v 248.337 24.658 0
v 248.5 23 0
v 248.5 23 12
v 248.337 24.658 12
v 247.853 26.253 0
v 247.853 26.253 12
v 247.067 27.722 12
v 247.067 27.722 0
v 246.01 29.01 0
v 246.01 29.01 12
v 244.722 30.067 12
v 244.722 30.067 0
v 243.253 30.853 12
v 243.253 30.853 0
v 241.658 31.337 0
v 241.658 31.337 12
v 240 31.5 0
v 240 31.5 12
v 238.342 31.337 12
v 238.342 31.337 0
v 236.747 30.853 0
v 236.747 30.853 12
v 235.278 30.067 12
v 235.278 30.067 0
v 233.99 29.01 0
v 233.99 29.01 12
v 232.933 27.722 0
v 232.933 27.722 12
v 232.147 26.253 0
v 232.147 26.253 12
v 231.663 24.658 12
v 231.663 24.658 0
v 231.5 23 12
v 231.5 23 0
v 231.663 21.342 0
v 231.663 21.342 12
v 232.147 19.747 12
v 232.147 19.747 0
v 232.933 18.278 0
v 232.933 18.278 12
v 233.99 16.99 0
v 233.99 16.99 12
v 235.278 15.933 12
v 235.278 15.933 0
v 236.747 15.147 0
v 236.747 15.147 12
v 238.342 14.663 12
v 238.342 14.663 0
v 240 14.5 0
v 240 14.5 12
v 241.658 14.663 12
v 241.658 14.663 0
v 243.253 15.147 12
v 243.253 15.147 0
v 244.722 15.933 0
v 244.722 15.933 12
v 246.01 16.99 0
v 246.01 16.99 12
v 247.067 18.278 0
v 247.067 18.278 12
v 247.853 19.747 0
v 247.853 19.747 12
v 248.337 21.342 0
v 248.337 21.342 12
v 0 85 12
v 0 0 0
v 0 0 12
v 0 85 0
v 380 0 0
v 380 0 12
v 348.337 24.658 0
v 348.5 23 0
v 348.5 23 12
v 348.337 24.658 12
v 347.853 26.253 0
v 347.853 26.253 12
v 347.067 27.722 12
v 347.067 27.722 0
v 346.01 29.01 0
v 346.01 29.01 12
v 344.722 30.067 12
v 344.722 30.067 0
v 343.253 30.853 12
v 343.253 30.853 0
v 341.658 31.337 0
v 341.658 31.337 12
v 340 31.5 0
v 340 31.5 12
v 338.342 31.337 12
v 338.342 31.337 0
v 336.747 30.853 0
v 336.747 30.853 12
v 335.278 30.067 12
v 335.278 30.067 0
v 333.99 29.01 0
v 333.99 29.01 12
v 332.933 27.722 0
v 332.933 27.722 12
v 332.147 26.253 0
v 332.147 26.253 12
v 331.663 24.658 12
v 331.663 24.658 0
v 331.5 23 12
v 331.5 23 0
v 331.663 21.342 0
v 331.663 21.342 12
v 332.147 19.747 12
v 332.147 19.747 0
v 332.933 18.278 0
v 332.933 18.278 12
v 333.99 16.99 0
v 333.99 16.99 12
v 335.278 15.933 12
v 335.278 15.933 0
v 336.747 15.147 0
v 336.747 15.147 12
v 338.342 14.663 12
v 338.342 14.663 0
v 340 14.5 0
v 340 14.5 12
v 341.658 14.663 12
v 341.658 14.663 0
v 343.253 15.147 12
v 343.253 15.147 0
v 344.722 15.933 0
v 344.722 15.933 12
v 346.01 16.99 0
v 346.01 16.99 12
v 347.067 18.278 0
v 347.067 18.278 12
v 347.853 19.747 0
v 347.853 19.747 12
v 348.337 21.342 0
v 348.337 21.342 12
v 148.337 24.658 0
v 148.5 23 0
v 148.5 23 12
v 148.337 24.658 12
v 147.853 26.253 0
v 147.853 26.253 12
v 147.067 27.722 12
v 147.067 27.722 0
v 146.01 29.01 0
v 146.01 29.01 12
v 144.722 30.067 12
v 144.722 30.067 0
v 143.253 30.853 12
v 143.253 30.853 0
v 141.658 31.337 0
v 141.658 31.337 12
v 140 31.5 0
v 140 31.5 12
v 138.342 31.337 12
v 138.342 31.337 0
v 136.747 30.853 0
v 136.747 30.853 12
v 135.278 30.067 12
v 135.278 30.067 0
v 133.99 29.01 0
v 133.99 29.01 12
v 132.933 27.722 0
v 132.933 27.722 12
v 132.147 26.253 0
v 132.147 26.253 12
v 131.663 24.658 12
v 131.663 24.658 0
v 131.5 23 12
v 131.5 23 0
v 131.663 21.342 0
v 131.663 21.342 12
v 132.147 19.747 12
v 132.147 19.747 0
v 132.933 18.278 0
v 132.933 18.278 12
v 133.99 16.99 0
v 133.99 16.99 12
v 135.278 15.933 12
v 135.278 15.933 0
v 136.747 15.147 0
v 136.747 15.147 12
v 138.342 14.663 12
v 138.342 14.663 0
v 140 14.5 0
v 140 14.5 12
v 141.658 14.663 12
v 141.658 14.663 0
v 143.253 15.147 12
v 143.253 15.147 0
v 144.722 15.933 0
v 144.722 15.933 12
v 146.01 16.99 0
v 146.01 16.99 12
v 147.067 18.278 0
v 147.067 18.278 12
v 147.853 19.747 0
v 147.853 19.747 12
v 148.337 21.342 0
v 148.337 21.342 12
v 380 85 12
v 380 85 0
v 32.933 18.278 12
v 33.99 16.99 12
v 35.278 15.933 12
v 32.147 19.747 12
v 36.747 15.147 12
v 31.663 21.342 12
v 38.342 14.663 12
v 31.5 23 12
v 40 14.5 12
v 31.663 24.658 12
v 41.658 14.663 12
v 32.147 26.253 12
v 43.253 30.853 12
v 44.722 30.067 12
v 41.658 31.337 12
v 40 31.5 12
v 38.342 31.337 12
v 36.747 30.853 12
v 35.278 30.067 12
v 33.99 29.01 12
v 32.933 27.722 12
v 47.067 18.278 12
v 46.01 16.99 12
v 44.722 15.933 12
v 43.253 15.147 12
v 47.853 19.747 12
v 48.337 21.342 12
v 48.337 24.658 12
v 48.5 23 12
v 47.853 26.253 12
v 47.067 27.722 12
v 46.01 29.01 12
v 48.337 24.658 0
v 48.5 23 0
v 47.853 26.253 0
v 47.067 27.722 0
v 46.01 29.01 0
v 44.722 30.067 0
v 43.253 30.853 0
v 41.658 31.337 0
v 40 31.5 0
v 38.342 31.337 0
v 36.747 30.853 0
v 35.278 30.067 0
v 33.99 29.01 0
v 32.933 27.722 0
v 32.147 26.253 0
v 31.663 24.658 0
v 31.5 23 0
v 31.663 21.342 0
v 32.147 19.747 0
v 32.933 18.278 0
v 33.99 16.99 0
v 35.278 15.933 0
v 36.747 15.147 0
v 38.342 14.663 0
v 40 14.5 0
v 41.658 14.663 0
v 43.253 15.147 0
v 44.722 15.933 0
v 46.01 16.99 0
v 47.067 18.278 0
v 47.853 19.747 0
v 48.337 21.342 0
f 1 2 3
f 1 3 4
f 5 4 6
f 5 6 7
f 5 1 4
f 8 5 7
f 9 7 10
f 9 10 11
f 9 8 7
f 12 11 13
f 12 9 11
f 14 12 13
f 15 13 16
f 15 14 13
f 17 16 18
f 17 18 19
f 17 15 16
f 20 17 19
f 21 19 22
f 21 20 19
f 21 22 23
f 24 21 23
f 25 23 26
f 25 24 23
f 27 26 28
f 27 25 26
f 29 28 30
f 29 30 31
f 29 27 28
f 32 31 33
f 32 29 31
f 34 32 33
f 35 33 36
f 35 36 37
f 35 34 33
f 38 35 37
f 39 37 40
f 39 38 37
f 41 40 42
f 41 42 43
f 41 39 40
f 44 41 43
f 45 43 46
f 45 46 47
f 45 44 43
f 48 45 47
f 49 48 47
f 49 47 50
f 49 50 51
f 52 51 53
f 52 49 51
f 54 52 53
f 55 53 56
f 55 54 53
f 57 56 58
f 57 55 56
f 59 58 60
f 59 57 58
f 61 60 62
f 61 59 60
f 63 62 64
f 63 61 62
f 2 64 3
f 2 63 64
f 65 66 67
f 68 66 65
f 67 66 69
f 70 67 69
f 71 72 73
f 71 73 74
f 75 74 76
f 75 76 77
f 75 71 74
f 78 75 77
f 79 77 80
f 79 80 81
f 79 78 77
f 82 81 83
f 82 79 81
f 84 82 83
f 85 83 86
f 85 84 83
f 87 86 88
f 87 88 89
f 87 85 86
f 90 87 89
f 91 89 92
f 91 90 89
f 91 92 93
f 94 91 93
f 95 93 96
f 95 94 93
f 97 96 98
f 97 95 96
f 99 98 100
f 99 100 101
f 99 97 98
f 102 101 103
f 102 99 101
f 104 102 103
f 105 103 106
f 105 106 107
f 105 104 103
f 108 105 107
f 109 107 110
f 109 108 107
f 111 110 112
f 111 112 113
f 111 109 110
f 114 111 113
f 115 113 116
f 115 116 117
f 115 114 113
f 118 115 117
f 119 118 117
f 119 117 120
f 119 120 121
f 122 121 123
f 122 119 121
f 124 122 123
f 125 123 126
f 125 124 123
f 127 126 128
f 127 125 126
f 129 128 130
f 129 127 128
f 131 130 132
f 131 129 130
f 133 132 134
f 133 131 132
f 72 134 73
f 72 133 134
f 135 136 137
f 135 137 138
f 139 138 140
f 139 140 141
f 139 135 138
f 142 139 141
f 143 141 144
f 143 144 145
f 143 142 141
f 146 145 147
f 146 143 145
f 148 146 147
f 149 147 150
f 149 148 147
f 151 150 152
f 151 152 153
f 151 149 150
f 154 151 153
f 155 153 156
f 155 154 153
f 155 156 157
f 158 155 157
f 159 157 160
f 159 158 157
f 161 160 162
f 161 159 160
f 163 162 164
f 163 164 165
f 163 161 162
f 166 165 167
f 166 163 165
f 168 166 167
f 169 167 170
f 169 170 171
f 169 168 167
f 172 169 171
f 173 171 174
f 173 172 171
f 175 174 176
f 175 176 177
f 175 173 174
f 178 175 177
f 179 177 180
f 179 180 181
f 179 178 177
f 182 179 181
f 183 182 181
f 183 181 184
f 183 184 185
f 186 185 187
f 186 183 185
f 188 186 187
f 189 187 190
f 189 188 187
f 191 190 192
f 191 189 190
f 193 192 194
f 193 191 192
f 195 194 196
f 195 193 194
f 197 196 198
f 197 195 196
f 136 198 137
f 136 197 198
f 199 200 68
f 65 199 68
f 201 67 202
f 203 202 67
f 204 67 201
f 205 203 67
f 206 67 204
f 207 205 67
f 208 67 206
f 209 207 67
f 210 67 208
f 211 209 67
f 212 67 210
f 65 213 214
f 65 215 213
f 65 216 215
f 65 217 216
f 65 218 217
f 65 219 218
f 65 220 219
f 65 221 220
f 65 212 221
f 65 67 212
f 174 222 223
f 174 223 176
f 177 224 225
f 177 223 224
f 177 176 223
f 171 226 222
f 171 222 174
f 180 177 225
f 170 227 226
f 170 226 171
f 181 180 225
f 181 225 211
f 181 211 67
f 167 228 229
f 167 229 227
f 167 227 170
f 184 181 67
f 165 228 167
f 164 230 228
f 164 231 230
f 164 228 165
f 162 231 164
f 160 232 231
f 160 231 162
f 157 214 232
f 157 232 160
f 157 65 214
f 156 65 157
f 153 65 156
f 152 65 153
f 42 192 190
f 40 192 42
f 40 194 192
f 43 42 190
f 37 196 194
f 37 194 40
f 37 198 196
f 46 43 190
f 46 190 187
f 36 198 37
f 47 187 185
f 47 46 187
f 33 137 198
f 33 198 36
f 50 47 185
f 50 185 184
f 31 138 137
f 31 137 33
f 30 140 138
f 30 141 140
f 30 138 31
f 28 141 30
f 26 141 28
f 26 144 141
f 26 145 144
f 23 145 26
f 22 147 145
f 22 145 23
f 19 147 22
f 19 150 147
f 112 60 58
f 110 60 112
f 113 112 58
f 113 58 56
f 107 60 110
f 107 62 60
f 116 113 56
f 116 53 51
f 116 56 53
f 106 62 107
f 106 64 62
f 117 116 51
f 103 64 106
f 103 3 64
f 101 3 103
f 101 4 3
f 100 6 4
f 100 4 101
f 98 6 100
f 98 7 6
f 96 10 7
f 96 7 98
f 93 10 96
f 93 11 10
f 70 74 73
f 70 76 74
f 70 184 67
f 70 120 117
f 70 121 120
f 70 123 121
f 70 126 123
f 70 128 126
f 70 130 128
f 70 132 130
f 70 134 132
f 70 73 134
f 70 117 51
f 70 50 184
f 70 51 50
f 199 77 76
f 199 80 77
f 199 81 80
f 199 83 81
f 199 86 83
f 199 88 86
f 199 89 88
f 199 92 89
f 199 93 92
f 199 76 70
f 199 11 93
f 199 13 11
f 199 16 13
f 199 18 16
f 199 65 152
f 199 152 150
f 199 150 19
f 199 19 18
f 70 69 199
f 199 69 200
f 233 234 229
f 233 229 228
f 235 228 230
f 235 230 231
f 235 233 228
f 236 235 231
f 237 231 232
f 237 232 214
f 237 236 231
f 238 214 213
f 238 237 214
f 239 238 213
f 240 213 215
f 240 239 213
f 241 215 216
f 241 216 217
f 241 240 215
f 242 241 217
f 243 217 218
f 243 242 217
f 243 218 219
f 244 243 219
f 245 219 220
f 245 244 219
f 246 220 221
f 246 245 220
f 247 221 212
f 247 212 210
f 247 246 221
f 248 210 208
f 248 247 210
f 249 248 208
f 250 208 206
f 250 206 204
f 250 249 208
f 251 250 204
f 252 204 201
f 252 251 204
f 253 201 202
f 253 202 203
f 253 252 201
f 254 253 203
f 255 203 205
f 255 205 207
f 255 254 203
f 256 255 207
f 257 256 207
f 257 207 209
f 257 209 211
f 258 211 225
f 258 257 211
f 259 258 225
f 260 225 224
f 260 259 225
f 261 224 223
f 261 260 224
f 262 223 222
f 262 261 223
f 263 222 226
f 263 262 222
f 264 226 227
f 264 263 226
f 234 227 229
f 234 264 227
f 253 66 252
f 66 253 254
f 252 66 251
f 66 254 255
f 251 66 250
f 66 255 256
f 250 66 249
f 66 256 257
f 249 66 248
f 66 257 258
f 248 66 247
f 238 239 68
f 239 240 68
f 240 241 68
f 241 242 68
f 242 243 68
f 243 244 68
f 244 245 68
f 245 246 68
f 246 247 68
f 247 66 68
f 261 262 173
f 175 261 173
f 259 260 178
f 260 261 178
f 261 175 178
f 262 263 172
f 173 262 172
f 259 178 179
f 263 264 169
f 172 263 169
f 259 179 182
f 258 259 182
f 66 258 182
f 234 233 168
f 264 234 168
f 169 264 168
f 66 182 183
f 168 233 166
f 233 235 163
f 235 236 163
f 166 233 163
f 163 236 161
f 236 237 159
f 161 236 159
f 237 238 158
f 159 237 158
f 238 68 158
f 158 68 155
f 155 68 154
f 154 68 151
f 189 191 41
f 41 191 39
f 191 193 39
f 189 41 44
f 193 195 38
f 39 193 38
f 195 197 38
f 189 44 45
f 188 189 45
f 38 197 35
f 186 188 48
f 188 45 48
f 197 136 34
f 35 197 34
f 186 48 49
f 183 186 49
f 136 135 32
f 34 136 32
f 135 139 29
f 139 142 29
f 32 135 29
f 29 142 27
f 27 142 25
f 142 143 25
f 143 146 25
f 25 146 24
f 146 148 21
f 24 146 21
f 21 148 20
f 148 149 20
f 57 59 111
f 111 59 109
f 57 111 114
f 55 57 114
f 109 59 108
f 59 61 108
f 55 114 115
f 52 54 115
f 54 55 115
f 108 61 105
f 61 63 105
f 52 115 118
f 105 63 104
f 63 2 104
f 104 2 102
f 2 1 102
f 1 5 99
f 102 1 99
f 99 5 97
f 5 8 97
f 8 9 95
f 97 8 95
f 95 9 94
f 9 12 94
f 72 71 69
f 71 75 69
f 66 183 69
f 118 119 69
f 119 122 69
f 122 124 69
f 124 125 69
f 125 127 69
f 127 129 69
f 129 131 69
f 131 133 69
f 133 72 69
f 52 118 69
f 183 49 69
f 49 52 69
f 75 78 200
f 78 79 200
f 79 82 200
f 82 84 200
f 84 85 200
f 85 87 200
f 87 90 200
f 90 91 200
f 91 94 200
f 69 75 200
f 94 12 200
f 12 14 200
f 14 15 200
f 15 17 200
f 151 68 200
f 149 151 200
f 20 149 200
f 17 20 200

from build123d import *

# Parameters (mm, degrees)
F0_W     = 190
F0_H     = 85
F0_R     = 8.5
F1_DEPTH = 12


with BuildPart() as f1:
    # F0 (on Top) → F1 (new body)
    with BuildSketch(Plane.XY):
        with Locations((95, 42.5)):
            Rectangle(F0_W, F0_H)
        with Locations((40, 23)):
            Circle(F0_R, mode=Mode.SUBTRACT)
        with Locations((140, 23)):
            Circle(F0_R, mode=Mode.SUBTRACT)
        with Locations((285, 42.5)):
            Rectangle(F0_W, F0_H)
        with Locations((240, 23)):
            Circle(F0_R, mode=Mode.SUBTRACT)
        with Locations((340, 23)):
            Circle(F0_R, mode=Mode.SUBTRACT)
    extrude(amount=F1_DEPTH)


solid = f1.part
